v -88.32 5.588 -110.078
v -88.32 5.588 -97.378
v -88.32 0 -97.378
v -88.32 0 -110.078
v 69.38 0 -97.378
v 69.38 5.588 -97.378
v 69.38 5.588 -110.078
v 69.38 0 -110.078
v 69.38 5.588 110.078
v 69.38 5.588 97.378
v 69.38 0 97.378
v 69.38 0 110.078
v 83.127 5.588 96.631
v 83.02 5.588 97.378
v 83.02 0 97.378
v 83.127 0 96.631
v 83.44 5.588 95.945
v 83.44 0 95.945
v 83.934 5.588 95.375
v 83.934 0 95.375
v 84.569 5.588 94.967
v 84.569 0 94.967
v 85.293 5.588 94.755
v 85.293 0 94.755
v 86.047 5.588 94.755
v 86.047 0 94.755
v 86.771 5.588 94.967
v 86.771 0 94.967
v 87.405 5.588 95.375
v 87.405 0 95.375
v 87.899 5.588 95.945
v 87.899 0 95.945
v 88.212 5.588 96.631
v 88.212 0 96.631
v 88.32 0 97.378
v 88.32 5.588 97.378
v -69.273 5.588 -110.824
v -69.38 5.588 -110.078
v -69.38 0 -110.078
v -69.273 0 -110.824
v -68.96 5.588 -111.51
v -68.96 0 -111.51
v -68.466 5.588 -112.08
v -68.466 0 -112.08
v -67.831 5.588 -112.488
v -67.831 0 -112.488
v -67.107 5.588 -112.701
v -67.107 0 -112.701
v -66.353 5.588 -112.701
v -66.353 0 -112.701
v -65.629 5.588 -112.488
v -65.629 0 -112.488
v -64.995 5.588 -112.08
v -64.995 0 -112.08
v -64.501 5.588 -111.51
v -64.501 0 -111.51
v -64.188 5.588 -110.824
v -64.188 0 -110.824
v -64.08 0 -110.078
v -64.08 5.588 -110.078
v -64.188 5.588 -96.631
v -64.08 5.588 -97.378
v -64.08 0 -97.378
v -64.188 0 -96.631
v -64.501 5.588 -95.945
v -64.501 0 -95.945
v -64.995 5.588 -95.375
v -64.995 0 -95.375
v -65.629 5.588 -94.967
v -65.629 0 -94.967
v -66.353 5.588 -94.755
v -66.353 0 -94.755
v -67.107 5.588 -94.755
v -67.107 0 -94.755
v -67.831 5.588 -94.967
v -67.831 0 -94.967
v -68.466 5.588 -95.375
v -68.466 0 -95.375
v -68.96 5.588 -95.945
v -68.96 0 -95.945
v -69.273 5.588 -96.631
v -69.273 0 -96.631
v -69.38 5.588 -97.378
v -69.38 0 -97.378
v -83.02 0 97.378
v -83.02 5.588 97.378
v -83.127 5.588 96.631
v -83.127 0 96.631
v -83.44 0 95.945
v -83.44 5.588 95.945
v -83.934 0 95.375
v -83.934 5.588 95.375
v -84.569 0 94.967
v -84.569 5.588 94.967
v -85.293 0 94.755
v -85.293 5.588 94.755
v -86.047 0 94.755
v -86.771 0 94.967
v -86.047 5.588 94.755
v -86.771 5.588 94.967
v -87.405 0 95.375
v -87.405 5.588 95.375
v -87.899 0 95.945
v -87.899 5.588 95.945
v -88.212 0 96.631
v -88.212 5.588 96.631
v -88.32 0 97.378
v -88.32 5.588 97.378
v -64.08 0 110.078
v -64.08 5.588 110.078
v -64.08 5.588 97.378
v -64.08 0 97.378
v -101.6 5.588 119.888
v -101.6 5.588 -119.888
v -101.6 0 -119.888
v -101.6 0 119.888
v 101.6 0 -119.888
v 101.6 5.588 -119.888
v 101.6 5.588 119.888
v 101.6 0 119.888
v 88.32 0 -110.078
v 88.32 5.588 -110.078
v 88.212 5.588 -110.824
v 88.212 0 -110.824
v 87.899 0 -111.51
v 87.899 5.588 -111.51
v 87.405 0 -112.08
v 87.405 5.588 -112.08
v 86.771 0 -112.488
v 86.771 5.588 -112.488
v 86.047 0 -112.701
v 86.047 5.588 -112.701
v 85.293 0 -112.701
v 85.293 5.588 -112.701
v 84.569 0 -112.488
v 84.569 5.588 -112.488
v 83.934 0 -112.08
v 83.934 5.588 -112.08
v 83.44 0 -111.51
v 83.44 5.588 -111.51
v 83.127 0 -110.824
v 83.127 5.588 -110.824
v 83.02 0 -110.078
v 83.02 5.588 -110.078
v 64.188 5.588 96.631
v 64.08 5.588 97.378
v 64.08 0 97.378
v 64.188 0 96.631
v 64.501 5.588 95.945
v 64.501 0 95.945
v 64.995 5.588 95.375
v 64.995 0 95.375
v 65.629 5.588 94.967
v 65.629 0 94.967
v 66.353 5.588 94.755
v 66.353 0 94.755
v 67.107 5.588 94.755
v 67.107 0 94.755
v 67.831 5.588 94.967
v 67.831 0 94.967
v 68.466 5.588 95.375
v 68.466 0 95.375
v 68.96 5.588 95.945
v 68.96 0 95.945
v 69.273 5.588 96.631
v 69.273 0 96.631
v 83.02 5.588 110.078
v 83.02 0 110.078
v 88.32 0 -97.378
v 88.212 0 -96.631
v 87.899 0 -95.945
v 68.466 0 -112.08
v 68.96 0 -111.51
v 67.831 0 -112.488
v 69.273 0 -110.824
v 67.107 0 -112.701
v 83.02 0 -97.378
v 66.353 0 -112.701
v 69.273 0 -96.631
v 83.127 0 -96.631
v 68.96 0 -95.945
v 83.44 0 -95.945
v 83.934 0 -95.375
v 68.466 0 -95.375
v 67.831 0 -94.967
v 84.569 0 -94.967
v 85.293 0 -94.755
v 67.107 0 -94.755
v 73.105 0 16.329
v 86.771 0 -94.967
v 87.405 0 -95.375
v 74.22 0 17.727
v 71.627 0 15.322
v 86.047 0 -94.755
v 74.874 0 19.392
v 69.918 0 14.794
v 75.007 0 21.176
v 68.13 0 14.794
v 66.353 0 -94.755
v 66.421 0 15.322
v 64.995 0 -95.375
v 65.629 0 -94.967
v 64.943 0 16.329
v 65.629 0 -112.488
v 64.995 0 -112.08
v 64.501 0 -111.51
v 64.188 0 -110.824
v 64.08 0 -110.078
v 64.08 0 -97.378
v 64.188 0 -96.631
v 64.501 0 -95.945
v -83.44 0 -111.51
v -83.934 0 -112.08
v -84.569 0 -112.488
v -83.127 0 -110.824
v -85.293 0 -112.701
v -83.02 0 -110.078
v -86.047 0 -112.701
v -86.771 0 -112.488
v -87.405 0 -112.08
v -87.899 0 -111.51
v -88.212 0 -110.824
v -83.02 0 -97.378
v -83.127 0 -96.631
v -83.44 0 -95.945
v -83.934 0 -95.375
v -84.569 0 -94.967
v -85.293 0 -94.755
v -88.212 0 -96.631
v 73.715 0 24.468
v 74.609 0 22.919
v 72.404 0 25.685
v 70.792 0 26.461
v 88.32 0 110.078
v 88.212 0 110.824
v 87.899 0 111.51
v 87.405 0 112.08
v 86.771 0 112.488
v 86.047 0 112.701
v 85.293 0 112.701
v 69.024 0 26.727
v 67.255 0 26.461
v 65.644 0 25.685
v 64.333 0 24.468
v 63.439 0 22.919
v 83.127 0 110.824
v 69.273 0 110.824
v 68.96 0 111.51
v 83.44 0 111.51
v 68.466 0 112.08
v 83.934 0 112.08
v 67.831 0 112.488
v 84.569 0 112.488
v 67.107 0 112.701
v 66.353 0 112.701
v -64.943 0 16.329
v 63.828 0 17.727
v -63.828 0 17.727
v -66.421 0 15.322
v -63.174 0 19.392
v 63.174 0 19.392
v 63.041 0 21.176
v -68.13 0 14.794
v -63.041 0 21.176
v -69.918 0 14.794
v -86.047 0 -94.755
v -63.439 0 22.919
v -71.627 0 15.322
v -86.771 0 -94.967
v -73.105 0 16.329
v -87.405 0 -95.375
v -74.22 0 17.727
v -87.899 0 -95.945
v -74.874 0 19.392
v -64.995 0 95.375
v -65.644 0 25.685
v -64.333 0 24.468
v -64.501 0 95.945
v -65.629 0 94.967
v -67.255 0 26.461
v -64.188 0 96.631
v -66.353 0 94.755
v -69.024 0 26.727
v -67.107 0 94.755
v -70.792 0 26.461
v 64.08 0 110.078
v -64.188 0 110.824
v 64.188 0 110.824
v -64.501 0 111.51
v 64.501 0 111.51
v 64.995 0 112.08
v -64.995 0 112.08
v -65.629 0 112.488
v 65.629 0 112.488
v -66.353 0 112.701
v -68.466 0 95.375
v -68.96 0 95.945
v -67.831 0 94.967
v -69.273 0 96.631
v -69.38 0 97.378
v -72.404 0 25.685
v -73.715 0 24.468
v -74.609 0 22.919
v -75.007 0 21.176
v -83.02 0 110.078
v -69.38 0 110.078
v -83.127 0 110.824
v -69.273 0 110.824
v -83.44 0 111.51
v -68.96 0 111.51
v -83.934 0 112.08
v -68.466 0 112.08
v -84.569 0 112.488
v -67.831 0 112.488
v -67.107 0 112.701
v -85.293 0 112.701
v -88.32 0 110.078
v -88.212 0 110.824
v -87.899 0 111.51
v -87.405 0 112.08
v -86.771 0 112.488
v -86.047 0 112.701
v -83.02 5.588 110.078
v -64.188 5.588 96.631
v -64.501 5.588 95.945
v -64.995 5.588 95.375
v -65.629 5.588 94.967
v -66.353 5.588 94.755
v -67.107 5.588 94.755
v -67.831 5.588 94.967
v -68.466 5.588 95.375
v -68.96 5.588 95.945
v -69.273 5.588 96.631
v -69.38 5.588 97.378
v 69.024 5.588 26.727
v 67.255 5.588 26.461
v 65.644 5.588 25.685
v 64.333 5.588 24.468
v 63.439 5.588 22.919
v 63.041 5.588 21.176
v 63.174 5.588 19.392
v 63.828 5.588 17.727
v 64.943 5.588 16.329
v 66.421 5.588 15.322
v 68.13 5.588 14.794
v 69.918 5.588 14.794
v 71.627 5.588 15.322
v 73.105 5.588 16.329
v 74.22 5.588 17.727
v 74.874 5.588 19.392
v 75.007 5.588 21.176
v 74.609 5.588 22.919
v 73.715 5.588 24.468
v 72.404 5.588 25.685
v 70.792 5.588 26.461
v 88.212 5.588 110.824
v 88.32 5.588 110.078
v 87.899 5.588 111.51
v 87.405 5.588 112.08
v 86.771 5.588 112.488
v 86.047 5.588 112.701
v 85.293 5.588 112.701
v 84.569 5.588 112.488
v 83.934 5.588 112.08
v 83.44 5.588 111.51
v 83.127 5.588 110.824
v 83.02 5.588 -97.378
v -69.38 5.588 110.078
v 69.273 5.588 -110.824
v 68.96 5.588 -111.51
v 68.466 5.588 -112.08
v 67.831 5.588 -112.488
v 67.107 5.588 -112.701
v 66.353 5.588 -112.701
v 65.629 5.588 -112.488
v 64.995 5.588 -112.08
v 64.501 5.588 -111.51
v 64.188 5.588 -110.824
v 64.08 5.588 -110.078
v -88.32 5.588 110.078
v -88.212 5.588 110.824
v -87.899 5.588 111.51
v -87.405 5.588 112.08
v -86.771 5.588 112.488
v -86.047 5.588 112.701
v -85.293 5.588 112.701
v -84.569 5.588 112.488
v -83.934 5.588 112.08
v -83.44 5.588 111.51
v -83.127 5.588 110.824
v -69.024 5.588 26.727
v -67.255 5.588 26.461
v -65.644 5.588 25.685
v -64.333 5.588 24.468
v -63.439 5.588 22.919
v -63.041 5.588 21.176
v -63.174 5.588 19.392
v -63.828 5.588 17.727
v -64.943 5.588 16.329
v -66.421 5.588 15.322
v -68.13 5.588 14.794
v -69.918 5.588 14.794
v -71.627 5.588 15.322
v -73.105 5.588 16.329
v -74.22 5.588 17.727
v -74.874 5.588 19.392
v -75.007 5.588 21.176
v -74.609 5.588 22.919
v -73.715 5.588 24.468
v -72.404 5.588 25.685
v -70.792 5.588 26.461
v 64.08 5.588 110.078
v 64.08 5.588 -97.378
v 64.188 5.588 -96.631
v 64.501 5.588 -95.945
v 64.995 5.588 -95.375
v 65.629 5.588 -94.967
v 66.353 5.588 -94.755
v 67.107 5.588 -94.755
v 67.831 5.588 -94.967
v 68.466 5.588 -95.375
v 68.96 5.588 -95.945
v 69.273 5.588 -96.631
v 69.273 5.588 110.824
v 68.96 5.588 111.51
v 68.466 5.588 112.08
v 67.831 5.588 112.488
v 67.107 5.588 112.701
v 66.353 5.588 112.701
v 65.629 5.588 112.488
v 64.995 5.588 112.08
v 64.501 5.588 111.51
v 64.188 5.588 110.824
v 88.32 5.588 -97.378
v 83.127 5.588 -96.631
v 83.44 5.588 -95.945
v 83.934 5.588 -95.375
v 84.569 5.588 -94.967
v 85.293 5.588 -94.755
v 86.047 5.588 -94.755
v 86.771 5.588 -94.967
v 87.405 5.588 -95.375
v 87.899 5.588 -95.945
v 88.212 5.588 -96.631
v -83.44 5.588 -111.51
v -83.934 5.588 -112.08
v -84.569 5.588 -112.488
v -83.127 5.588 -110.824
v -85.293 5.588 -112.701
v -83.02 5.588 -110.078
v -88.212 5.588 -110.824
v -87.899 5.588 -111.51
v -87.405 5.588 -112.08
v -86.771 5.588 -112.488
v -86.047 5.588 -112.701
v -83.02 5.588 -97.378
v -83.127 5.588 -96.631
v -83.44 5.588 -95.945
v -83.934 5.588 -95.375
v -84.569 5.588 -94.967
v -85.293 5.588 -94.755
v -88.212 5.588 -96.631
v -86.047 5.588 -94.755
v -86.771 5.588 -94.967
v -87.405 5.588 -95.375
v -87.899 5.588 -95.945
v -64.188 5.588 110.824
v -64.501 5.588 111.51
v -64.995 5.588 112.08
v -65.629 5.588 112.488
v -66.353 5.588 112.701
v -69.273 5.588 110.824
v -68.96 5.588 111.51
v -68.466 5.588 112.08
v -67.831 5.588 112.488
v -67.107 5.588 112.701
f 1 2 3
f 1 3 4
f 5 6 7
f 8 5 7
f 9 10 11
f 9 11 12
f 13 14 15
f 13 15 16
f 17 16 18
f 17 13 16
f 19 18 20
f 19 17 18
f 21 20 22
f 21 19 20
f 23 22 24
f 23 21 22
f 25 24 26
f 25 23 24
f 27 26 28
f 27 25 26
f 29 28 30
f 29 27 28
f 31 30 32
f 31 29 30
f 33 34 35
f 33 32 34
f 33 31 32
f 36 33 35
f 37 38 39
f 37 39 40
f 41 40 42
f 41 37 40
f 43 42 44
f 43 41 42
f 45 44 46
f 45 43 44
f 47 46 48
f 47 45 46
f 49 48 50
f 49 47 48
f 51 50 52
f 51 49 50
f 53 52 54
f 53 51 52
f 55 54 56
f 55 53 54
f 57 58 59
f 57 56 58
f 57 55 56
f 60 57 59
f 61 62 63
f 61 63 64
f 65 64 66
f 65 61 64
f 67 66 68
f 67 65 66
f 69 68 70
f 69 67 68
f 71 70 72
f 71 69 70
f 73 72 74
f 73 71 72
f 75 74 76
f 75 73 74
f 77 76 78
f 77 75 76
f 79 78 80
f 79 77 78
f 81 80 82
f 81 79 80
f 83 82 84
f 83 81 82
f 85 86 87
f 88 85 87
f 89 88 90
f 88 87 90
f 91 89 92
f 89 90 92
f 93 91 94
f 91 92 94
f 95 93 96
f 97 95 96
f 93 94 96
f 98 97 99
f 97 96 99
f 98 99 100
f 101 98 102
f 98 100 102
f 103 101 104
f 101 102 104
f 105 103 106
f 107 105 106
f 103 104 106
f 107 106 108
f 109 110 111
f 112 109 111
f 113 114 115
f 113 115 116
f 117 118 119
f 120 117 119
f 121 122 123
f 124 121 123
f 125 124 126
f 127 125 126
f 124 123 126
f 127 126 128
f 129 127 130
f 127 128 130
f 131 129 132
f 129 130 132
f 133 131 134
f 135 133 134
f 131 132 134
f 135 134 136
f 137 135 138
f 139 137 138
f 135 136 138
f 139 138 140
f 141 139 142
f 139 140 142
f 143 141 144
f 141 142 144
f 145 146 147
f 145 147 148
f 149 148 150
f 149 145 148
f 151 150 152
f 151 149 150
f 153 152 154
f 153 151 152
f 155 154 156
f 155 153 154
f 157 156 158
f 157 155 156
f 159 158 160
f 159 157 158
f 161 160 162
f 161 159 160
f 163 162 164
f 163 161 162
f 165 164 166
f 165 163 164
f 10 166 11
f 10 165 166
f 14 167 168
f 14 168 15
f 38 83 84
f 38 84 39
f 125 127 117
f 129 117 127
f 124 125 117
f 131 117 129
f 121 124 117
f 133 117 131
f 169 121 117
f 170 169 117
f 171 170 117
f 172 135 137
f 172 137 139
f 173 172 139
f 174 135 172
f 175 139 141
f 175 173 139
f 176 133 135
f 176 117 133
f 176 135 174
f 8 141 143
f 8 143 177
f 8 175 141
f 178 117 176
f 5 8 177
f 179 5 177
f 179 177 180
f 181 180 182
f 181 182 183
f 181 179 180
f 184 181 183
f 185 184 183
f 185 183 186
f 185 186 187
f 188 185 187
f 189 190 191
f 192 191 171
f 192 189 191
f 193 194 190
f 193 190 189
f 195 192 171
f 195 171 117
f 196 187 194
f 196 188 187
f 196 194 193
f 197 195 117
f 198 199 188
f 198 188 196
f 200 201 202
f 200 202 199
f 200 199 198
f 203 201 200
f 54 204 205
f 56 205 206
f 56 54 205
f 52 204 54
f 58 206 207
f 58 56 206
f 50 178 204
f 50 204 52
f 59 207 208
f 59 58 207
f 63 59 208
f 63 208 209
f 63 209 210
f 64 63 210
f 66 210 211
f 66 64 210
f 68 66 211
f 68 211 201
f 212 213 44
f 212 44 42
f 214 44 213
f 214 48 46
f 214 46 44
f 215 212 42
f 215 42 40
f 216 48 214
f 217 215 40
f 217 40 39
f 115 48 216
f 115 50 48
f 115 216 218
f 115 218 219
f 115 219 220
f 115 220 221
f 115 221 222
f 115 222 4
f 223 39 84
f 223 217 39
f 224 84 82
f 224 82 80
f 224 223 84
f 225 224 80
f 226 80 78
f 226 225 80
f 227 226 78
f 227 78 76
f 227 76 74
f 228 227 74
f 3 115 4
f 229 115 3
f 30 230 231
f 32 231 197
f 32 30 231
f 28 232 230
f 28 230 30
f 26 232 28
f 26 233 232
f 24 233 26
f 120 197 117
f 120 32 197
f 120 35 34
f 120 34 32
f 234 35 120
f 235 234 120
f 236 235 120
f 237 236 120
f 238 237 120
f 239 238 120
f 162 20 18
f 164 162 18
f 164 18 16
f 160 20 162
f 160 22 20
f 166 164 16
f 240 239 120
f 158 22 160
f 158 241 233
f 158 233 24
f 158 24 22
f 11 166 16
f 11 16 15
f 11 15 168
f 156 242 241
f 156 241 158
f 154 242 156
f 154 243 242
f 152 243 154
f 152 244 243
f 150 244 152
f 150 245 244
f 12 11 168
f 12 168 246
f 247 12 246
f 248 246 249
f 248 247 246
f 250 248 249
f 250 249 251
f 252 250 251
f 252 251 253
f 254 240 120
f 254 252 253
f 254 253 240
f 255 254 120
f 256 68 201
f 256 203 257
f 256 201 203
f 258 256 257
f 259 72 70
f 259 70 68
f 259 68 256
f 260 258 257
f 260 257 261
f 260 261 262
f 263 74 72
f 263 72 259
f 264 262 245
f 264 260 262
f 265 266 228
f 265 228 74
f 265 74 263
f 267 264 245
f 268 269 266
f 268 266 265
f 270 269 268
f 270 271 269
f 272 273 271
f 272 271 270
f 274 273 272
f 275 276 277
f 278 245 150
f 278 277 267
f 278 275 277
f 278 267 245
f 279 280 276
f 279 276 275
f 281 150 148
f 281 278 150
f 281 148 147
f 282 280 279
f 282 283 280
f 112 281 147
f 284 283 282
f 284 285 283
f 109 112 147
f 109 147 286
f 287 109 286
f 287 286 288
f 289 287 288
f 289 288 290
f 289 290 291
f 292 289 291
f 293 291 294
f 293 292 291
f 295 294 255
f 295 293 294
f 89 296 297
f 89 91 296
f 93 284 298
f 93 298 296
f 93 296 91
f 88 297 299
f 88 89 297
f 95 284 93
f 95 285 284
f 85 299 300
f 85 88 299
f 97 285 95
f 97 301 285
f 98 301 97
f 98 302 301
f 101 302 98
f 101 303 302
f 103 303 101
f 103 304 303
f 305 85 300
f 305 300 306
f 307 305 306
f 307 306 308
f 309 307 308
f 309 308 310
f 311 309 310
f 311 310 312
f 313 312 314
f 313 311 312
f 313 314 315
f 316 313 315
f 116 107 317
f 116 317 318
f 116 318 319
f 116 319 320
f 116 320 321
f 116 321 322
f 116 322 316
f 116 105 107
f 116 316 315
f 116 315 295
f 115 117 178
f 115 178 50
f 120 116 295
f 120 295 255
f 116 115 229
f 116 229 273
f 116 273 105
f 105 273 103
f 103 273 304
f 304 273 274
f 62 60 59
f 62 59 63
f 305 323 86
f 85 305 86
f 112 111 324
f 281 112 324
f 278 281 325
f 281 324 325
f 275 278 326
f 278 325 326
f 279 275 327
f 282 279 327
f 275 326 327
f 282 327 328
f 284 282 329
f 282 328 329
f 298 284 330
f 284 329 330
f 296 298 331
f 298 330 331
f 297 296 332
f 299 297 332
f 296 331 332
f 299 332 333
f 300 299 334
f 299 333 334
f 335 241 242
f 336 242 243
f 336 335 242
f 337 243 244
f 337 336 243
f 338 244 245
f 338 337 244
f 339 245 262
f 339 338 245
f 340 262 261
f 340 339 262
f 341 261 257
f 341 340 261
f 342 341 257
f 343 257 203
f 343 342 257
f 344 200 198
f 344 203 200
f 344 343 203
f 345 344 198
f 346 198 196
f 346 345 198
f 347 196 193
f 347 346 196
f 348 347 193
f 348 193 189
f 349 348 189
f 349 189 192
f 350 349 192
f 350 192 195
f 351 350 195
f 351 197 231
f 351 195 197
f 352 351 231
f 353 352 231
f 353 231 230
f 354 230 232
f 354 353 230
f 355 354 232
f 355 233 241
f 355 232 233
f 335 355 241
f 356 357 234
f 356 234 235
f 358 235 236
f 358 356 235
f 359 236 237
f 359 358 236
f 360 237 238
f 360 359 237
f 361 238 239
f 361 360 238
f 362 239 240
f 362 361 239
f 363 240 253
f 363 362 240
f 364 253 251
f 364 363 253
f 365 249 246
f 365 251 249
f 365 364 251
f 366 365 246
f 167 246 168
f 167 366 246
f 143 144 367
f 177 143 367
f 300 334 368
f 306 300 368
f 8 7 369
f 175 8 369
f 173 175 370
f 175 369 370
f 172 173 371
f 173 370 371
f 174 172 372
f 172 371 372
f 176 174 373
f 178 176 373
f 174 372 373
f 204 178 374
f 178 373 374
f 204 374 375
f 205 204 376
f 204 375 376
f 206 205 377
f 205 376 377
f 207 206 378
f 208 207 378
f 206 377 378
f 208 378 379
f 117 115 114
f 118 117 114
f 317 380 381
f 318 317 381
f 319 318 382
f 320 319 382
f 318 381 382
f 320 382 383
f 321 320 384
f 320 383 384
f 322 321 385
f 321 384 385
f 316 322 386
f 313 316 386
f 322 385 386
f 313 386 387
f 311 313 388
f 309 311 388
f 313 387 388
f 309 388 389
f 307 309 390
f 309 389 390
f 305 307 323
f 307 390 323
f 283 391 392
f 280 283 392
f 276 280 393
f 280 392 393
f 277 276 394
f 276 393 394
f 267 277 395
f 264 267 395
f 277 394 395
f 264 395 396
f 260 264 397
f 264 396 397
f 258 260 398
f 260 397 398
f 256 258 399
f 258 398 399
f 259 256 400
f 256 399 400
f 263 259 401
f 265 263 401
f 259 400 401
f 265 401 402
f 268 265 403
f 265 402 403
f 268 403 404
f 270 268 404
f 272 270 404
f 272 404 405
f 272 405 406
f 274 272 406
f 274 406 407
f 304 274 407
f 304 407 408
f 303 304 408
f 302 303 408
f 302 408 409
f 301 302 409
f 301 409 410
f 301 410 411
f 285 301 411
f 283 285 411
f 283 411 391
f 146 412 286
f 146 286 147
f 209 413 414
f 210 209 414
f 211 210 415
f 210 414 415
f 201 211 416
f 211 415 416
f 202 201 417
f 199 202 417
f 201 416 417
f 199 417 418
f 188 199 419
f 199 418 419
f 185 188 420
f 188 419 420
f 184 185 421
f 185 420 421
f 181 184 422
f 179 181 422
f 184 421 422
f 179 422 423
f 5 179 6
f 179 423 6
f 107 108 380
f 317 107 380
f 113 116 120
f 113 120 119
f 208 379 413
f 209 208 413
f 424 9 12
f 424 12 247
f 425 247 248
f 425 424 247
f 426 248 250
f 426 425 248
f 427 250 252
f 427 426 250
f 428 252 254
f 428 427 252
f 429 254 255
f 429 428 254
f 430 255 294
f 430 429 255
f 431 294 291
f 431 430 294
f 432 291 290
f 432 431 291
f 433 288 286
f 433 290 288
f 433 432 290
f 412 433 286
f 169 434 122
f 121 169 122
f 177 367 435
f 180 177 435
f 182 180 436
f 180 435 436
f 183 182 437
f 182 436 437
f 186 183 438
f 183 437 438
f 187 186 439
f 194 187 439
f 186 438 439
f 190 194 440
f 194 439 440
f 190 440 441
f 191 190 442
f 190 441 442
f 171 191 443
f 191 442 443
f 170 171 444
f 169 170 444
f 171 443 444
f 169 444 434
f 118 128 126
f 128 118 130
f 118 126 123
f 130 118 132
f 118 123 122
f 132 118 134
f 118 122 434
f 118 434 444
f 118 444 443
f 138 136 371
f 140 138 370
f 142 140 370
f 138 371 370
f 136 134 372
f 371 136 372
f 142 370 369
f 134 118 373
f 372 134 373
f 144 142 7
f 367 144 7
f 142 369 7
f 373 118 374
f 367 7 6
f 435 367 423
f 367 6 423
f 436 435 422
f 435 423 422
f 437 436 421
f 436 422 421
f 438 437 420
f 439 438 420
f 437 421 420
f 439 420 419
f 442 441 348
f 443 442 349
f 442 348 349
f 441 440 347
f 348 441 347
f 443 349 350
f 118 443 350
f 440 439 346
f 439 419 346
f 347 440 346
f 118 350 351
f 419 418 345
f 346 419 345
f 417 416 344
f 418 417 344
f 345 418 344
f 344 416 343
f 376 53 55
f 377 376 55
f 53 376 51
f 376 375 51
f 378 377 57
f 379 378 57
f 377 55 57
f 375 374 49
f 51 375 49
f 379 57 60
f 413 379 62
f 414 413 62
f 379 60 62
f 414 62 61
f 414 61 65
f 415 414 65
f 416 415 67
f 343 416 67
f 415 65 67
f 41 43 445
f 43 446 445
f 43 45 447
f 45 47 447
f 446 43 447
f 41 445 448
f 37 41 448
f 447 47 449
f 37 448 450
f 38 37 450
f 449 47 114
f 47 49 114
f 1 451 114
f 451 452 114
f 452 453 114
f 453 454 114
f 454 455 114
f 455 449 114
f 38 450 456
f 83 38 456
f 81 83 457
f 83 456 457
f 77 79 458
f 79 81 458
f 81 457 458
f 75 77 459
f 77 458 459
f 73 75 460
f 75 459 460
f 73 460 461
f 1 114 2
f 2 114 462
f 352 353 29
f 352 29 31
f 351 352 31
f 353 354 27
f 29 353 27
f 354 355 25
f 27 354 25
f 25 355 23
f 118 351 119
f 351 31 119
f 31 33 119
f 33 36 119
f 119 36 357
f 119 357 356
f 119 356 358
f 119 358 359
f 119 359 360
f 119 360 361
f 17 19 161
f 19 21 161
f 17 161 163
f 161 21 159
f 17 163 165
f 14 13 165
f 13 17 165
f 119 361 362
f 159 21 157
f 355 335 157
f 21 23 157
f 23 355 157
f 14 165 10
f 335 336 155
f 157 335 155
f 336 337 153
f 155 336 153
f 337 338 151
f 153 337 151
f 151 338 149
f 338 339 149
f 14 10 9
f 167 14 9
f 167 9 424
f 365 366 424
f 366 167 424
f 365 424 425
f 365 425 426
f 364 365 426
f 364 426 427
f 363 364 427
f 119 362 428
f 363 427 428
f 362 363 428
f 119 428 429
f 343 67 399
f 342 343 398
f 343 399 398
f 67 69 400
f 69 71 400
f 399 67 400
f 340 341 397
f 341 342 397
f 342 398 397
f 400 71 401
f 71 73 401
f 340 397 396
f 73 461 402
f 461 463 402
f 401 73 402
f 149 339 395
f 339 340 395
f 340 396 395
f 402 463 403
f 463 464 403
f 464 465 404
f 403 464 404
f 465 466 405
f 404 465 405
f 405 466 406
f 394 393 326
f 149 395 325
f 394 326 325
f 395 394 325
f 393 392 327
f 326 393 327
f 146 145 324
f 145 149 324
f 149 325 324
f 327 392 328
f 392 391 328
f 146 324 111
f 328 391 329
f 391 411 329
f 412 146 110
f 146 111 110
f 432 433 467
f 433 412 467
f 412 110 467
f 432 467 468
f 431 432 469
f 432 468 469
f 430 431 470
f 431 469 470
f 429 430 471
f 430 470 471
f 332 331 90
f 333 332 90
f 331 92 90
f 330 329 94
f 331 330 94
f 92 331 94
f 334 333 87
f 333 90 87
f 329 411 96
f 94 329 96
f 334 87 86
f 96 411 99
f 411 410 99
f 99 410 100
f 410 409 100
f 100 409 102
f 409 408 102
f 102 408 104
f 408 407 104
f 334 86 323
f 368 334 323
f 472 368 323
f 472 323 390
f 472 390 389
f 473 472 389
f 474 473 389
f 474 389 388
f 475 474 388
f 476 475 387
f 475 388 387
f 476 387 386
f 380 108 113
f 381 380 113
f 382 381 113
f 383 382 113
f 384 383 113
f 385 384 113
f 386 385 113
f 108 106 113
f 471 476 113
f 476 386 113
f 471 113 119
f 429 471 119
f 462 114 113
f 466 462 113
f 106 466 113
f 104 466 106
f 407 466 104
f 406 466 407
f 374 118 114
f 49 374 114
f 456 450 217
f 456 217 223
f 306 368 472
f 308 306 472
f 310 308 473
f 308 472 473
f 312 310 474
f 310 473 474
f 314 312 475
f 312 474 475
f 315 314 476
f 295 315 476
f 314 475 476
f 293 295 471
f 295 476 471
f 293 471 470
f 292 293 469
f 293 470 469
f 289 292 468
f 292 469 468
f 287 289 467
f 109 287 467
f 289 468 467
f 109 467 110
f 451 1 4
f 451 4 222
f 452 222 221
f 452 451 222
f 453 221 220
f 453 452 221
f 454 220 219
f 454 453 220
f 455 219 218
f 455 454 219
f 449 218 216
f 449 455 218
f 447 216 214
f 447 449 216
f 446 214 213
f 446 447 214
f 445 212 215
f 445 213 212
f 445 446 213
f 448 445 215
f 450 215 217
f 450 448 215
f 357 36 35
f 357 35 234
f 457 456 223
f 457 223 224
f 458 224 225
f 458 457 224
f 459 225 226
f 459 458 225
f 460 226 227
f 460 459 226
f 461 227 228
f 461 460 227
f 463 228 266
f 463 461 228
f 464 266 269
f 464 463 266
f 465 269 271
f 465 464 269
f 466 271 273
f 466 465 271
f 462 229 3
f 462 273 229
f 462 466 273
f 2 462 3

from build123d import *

# Parameters (mm, degrees)
SKETCH1_W                                = 152.4
SKETCH1_H                                = 239.776
BOSS_EXTRUDE1_DEPTH                      = 5.588
CUT_EXTRUDE6_DEPTH                       = 432.430054712
MIRROR1_AT_THE_SECOND_PLANE_COPY_1_DEPTH = 432.430054712
SKETCH8_W                                = 239.776
SKETCH8_H                                = 5.588
BOSS_EXTRUDE2_DEPTH                      = 25.4
CUT_EXTRUDE7_DEPTH                       = 158.247951618
SKETCH10_R                               = 6
CUT_EXTRUDE8_DEPTH                       = 456.882202726


with BuildPart() as part:
    # Sketch1 → Boss-Extrude1 (new body)
    with BuildSketch(Plane(origin=(0, 0, 0), x_dir=(1, 0, 0), z_dir=(0, 1, 0))):
        Rectangle(SKETCH1_W, SKETCH1_H)
    extrude(amount=BOSS_EXTRUDE1_DEPTH)

    # Sketch7 → Cut-Extrude6 (cut, through all)
    with BuildSketch(Plane(origin=(-338.200209725, 5.588, 0), x_dir=(1, 0, 0), z_dir=(0, 1, 0))):
        with BuildLine():
            Line((268.819954903, 97.377738503), (268.819954903, 110.077738503))
            ThreePointArc((268.819954903, 110.077738503), (271.469954903, 112.727738503), (274.119954903, 110.077738503))
            Line((274.119954903, 110.077738503), (274.119954903, 97.377738503))
            ThreePointArc((274.119954903, 97.377738503), (271.469954903, 94.727738503), (268.819954903, 97.377738503))
        make_face()
    cut_extrude6 = extrude(amount=-CUT_EXTRUDE6_DEPTH, mode=Mode.SUBTRACT)

    # Mirror1: Cut-Extrude6 across plane
    add(cut_extrude6.mirror(Plane.XY), mode=Mode.SUBTRACT)

    # Mirror1 at the second plane: Cut-Extrude6 across plane
    add(cut_extrude6.mirror(Plane(origin=(0, 0, 0), x_dir=(0, 0, 1), z_dir=(1, 0, 0))), mode=Mode.SUBTRACT)

    # Mirror1 at the second plane copy 1 sketc → Mirror1 at the second plane copy 1 (cut, through all)
    with BuildSketch(Plane(origin=(338.200209725, 5.588, 0), x_dir=(-1, 0, 0), z_dir=(0, 1, 0))):
        with BuildLine():
            Line((268.819954903, 97.377738503), (268.819954903, 110.077738503))
            ThreePointArc((268.819954903, 110.077738503), (271.469954903, 112.727738503), (274.119954903, 110.077738503))
            Line((274.119954903, 110.077738503), (274.119954903, 97.377738503))
            ThreePointArc((274.119954903, 97.377738503), (271.469954903, 94.727738503), (268.819954903, 97.377738503))
        make_face()
    extrude(amount=-MIRROR1_AT_THE_SECOND_PLANE_COPY_1_DEPTH, mode=Mode.SUBTRACT)

    # Sketch8 → Boss-Extrude2 (add)
    with BuildSketch(Plane.ZY.offset(76.2)):
        with Locations((0, 2.794)):
            Rectangle(SKETCH8_W, SKETCH8_H)
    boss_extrude2 = extrude(amount=BOSS_EXTRUDE2_DEPTH)

    # Sketch9 → Cut-Extrude7 (cut, through all)
    with BuildSketch(Plane(origin=(0, 5.588, 0), x_dir=(1, 0, 0), z_dir=(0, 1, 0))):
        with BuildLine():
            Line((-69.380254823, 110.077738503), (-69.380254823, 97.377738503))
            ThreePointArc((-69.380254823, 97.377738503), (-66.730254823, 94.727738503), (-64.080254823, 97.377738503))
            Line((-64.080254823, 97.377738503), (-64.080254823, 110.077738503))
            ThreePointArc((-64.080254823, 110.077738503), (-66.730254823, 112.727738503), (-69.380254823, 110.077738503))
        make_face()
        with BuildLine():
            Line((-88.319745177, 97.377738503), (-88.319745177, 110.077738503))
            ThreePointArc((-88.319745177, 110.077738503), (-85.669745177, 112.727738503), (-83.019745177, 110.077738503))
            Line((-83.019745177, 110.077738503), (-83.019745177, 97.377738503))
            ThreePointArc((-83.019745177, 97.377738503), (-85.669745177, 94.727738503), (-88.319745177, 97.377738503))
        make_face()
        with BuildLine():
            Line((-88.319745177, -97.377738503), (-88.319745177, -110.077738503))
            ThreePointArc((-88.319745177, -110.077738503), (-85.669745177, -112.727738503), (-83.019745177, -110.077738503))
            Line((-83.019745177, -110.077738503), (-83.019745177, -97.377738503))
            ThreePointArc((-83.019745177, -97.377738503), (-85.669745177, -94.727738503), (-88.319745177, -97.377738503))
        make_face()
    cut_extrude7 = extrude(amount=-CUT_EXTRUDE7_DEPTH, mode=Mode.SUBTRACT)

    # Mirror2: Boss-Extrude2, Cut-Extrude7 across plane
    add(boss_extrude2.mirror(Plane(origin=(0, 0, 0), x_dir=(0, 0, 1), z_dir=(1, 0, 0))))
    add(cut_extrude7.mirror(Plane(origin=(0, 0, 0), x_dir=(0, 0, 1), z_dir=(1, 0, 0))), mode=Mode.SUBTRACT)

    # Sketch10 → Cut-Extrude8 (cut, through all)
    with BuildSketch(Plane(origin=(-338.200209725, 5.588, 0), x_dir=(1, 0, 0), z_dir=(0, 1, 0))):
        with Locations(Location((269.176273717, -20.727348554, 0), (0, 0, 270))):
            Circle(SKETCH10_R)
    cut_extrude8 = extrude(amount=-CUT_EXTRUDE8_DEPTH, mode=Mode.SUBTRACT)

    # Mirror3: Cut-Extrude8 across plane
    add(cut_extrude8.mirror(Plane(origin=(0, 0, 0), x_dir=(0, 0, 1), z_dir=(1, 0, 0))), mode=Mode.SUBTRACT)


solid = part.part
